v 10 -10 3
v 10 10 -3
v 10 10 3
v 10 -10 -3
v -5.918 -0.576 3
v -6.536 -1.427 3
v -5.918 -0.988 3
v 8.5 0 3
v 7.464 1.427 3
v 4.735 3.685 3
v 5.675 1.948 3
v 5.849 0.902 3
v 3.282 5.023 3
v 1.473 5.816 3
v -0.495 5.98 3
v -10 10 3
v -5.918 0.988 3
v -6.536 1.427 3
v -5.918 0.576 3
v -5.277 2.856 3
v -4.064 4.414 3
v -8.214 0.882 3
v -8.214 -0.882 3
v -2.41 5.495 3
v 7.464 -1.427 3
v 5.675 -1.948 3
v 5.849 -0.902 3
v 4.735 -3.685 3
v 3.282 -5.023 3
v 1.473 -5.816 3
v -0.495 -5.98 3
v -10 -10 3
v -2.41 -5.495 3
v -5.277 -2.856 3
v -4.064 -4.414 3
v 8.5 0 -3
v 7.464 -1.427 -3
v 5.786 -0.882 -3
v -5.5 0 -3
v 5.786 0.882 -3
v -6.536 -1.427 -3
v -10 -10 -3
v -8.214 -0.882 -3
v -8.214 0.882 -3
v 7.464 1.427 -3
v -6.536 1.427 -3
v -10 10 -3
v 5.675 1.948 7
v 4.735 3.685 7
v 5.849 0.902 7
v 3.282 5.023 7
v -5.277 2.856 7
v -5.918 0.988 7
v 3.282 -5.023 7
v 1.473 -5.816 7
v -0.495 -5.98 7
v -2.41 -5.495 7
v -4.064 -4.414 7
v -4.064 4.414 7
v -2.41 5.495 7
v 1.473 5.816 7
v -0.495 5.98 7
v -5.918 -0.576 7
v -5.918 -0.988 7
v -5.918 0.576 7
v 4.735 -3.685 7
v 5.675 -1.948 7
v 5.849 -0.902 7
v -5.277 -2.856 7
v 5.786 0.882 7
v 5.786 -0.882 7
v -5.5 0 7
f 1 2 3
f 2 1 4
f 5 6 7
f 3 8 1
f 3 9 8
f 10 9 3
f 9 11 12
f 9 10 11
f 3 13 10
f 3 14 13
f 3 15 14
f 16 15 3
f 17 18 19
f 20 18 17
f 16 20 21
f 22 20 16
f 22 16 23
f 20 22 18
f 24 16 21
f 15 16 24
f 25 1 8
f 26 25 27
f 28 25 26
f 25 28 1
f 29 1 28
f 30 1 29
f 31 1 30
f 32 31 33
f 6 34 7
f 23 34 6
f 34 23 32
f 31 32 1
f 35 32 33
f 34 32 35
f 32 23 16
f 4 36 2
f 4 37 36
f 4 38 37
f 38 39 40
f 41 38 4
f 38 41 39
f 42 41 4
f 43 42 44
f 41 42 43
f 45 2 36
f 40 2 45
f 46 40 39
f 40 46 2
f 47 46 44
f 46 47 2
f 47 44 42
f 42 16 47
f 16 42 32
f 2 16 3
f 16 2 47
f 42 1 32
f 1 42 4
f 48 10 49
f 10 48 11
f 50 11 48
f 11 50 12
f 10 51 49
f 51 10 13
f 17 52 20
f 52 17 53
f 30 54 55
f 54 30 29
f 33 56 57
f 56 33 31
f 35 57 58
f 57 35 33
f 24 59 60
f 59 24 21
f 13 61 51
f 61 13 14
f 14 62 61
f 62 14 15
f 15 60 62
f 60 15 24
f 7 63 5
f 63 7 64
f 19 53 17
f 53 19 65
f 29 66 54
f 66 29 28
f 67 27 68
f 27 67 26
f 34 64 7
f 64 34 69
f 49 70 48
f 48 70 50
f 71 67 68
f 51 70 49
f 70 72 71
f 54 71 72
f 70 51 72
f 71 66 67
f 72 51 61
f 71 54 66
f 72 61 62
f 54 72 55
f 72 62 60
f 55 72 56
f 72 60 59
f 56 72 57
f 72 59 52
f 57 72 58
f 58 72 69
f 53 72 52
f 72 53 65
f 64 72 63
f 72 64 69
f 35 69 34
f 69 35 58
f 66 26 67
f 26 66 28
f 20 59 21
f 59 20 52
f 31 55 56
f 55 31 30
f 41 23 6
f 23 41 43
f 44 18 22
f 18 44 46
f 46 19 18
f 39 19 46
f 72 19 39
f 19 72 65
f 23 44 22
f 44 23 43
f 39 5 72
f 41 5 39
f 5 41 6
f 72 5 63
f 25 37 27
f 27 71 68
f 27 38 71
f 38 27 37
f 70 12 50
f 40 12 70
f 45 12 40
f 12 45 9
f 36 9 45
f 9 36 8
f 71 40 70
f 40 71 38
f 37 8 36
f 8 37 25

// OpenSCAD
// CSG core: union + difference + intersection, transforms, and a for-loop.
difference() {
    union() {
        cube([20, 20, 6], center = true);
        translate([0, 0, 3]) cylinder(h = 8, r = 6, center = true);
    }
    for (a = [-1, 1])
        translate([a * 7, 0, 0]) cylinder(h = 20, r = 1.5, center = true);
}
